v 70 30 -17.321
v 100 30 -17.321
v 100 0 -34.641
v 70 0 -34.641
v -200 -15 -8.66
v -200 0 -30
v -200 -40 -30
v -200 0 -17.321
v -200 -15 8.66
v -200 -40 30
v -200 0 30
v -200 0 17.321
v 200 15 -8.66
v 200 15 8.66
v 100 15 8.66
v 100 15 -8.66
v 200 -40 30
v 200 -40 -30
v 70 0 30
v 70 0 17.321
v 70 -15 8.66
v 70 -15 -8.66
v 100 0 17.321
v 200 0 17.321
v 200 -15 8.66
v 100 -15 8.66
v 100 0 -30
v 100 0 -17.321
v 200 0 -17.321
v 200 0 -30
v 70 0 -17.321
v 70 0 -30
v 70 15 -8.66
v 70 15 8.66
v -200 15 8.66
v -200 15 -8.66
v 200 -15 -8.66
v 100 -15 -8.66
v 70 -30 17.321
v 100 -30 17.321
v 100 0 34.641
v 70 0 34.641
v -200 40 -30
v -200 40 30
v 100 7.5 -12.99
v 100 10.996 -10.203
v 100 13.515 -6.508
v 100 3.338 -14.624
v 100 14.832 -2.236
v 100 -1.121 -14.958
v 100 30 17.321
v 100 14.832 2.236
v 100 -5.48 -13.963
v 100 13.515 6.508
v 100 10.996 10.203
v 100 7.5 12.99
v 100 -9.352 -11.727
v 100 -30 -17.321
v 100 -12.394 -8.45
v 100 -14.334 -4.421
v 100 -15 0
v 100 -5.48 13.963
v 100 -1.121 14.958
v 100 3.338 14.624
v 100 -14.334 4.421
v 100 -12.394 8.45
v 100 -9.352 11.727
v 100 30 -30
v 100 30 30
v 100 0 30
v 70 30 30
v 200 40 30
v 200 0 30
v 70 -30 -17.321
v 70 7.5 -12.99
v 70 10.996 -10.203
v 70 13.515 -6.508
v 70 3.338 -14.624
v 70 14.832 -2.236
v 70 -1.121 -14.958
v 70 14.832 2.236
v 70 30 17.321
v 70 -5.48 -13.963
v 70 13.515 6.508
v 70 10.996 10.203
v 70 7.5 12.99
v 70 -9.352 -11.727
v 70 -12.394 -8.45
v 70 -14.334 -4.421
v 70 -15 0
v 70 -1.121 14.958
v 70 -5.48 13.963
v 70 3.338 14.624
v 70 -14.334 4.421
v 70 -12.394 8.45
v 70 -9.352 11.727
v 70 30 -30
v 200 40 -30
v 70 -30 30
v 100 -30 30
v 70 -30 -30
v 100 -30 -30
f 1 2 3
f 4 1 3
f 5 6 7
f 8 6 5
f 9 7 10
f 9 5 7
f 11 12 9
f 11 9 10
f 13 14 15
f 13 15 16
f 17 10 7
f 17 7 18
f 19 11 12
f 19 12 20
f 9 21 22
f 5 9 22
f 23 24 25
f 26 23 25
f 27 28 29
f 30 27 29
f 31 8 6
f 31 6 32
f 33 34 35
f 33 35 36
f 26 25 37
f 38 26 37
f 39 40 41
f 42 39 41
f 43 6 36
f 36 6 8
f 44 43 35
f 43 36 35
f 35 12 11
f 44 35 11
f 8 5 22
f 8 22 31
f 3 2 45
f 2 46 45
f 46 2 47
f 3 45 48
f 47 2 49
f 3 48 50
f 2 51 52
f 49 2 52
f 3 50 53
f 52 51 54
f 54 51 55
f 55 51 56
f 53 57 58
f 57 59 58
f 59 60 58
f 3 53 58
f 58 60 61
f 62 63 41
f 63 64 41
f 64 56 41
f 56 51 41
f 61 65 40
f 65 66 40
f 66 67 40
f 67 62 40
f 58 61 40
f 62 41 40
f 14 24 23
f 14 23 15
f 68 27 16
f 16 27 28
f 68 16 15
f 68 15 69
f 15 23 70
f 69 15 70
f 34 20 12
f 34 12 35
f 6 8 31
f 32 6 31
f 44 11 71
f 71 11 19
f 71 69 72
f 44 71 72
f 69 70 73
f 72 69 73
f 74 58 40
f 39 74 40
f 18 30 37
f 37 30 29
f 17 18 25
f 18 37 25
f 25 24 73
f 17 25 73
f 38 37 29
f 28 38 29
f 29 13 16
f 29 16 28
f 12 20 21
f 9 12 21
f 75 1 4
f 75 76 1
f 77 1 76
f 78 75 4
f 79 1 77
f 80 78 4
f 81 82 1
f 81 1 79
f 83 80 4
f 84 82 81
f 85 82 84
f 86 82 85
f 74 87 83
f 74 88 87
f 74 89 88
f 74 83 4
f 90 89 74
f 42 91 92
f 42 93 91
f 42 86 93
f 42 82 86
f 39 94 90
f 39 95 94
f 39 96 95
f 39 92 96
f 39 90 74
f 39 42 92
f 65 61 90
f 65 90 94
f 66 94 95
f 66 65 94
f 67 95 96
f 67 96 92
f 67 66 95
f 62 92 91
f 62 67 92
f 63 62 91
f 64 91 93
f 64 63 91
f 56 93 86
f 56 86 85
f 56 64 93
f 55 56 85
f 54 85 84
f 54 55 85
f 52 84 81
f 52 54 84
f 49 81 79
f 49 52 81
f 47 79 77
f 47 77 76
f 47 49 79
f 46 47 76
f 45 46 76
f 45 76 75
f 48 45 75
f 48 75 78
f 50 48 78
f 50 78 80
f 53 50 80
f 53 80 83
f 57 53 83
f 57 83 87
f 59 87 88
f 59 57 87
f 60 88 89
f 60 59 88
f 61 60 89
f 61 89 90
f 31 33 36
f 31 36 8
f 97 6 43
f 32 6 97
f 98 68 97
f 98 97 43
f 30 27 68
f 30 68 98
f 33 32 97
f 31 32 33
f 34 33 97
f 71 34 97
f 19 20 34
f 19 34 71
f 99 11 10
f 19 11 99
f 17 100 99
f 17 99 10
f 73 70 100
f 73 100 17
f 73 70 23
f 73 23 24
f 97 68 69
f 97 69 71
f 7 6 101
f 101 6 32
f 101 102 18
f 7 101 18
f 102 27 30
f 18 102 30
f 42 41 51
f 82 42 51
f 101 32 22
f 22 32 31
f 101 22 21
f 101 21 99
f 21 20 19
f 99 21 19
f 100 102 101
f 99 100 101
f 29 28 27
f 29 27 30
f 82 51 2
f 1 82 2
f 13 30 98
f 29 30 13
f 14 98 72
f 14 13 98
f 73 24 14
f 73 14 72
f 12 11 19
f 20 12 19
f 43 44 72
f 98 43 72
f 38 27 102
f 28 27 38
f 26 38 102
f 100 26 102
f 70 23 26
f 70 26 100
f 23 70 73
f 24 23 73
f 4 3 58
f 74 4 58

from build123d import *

# Parameters (mm, degrees)
F1_W     = 400
F1_H     = 60
F2_DEPTH = 40
F4_DEPTH = 400.001
F5_W     = 30
F5_H     = 60
F6_DEPTH = 30
F7_R     = 15
F8_DEPTH = 30


with BuildPart() as f2:
    # F1 (on Front) → F2 (new body)
    with BuildSketch(Plane.XZ):
        Rectangle(F1_W, F1_H)
    extrude(amount=F2_DEPTH)

    # F3 (on face) → F4 (cut, through all)
    with BuildSketch(Plane.YZ.offset(200)):
        Polygon((0, 17.3205080757), (-15, 8.6602540378), (-15, -8.6602540378), (0, -17.3205080757), (15, -8.6602540378), (15, 8.6602540378), align=None)
    extrude(amount=-F4_DEPTH, mode=Mode.SUBTRACT)

    # F5 (on face) → F6 (cut)
    with BuildSketch(Plane(origin=(0, 0, 0), x_dir=(-1, 0, 0), z_dir=(0, 1, 0))):
        with Locations((-85, 0)):
            Rectangle(F5_W, F5_H)
    extrude(amount=-F6_DEPTH, mode=Mode.SUBTRACT)


with BuildPart() as f8:
    # F7 (on face) → F8 (new body, through all)
    with BuildSketch(Plane(origin=(100, 0, 0), x_dir=(0, -1, 0), z_dir=(-1, 0, 0))):
        Polygon((0, -34.6410161514), (30, -17.3205080757), (30, 17.3205080757), (0, 34.6410161514), (-30, 17.3205080757), (-30, -17.3205080757), align=None)
        Circle(F7_R, mode=Mode.SUBTRACT)
    extrude(amount=F8_DEPTH)


with BuildPart() as f9_1:
    # F9: instance of F2
    add(f2.part.mirror(Plane.XZ))


solid = Compound([f2.part, f8.part, f9_1.part])
